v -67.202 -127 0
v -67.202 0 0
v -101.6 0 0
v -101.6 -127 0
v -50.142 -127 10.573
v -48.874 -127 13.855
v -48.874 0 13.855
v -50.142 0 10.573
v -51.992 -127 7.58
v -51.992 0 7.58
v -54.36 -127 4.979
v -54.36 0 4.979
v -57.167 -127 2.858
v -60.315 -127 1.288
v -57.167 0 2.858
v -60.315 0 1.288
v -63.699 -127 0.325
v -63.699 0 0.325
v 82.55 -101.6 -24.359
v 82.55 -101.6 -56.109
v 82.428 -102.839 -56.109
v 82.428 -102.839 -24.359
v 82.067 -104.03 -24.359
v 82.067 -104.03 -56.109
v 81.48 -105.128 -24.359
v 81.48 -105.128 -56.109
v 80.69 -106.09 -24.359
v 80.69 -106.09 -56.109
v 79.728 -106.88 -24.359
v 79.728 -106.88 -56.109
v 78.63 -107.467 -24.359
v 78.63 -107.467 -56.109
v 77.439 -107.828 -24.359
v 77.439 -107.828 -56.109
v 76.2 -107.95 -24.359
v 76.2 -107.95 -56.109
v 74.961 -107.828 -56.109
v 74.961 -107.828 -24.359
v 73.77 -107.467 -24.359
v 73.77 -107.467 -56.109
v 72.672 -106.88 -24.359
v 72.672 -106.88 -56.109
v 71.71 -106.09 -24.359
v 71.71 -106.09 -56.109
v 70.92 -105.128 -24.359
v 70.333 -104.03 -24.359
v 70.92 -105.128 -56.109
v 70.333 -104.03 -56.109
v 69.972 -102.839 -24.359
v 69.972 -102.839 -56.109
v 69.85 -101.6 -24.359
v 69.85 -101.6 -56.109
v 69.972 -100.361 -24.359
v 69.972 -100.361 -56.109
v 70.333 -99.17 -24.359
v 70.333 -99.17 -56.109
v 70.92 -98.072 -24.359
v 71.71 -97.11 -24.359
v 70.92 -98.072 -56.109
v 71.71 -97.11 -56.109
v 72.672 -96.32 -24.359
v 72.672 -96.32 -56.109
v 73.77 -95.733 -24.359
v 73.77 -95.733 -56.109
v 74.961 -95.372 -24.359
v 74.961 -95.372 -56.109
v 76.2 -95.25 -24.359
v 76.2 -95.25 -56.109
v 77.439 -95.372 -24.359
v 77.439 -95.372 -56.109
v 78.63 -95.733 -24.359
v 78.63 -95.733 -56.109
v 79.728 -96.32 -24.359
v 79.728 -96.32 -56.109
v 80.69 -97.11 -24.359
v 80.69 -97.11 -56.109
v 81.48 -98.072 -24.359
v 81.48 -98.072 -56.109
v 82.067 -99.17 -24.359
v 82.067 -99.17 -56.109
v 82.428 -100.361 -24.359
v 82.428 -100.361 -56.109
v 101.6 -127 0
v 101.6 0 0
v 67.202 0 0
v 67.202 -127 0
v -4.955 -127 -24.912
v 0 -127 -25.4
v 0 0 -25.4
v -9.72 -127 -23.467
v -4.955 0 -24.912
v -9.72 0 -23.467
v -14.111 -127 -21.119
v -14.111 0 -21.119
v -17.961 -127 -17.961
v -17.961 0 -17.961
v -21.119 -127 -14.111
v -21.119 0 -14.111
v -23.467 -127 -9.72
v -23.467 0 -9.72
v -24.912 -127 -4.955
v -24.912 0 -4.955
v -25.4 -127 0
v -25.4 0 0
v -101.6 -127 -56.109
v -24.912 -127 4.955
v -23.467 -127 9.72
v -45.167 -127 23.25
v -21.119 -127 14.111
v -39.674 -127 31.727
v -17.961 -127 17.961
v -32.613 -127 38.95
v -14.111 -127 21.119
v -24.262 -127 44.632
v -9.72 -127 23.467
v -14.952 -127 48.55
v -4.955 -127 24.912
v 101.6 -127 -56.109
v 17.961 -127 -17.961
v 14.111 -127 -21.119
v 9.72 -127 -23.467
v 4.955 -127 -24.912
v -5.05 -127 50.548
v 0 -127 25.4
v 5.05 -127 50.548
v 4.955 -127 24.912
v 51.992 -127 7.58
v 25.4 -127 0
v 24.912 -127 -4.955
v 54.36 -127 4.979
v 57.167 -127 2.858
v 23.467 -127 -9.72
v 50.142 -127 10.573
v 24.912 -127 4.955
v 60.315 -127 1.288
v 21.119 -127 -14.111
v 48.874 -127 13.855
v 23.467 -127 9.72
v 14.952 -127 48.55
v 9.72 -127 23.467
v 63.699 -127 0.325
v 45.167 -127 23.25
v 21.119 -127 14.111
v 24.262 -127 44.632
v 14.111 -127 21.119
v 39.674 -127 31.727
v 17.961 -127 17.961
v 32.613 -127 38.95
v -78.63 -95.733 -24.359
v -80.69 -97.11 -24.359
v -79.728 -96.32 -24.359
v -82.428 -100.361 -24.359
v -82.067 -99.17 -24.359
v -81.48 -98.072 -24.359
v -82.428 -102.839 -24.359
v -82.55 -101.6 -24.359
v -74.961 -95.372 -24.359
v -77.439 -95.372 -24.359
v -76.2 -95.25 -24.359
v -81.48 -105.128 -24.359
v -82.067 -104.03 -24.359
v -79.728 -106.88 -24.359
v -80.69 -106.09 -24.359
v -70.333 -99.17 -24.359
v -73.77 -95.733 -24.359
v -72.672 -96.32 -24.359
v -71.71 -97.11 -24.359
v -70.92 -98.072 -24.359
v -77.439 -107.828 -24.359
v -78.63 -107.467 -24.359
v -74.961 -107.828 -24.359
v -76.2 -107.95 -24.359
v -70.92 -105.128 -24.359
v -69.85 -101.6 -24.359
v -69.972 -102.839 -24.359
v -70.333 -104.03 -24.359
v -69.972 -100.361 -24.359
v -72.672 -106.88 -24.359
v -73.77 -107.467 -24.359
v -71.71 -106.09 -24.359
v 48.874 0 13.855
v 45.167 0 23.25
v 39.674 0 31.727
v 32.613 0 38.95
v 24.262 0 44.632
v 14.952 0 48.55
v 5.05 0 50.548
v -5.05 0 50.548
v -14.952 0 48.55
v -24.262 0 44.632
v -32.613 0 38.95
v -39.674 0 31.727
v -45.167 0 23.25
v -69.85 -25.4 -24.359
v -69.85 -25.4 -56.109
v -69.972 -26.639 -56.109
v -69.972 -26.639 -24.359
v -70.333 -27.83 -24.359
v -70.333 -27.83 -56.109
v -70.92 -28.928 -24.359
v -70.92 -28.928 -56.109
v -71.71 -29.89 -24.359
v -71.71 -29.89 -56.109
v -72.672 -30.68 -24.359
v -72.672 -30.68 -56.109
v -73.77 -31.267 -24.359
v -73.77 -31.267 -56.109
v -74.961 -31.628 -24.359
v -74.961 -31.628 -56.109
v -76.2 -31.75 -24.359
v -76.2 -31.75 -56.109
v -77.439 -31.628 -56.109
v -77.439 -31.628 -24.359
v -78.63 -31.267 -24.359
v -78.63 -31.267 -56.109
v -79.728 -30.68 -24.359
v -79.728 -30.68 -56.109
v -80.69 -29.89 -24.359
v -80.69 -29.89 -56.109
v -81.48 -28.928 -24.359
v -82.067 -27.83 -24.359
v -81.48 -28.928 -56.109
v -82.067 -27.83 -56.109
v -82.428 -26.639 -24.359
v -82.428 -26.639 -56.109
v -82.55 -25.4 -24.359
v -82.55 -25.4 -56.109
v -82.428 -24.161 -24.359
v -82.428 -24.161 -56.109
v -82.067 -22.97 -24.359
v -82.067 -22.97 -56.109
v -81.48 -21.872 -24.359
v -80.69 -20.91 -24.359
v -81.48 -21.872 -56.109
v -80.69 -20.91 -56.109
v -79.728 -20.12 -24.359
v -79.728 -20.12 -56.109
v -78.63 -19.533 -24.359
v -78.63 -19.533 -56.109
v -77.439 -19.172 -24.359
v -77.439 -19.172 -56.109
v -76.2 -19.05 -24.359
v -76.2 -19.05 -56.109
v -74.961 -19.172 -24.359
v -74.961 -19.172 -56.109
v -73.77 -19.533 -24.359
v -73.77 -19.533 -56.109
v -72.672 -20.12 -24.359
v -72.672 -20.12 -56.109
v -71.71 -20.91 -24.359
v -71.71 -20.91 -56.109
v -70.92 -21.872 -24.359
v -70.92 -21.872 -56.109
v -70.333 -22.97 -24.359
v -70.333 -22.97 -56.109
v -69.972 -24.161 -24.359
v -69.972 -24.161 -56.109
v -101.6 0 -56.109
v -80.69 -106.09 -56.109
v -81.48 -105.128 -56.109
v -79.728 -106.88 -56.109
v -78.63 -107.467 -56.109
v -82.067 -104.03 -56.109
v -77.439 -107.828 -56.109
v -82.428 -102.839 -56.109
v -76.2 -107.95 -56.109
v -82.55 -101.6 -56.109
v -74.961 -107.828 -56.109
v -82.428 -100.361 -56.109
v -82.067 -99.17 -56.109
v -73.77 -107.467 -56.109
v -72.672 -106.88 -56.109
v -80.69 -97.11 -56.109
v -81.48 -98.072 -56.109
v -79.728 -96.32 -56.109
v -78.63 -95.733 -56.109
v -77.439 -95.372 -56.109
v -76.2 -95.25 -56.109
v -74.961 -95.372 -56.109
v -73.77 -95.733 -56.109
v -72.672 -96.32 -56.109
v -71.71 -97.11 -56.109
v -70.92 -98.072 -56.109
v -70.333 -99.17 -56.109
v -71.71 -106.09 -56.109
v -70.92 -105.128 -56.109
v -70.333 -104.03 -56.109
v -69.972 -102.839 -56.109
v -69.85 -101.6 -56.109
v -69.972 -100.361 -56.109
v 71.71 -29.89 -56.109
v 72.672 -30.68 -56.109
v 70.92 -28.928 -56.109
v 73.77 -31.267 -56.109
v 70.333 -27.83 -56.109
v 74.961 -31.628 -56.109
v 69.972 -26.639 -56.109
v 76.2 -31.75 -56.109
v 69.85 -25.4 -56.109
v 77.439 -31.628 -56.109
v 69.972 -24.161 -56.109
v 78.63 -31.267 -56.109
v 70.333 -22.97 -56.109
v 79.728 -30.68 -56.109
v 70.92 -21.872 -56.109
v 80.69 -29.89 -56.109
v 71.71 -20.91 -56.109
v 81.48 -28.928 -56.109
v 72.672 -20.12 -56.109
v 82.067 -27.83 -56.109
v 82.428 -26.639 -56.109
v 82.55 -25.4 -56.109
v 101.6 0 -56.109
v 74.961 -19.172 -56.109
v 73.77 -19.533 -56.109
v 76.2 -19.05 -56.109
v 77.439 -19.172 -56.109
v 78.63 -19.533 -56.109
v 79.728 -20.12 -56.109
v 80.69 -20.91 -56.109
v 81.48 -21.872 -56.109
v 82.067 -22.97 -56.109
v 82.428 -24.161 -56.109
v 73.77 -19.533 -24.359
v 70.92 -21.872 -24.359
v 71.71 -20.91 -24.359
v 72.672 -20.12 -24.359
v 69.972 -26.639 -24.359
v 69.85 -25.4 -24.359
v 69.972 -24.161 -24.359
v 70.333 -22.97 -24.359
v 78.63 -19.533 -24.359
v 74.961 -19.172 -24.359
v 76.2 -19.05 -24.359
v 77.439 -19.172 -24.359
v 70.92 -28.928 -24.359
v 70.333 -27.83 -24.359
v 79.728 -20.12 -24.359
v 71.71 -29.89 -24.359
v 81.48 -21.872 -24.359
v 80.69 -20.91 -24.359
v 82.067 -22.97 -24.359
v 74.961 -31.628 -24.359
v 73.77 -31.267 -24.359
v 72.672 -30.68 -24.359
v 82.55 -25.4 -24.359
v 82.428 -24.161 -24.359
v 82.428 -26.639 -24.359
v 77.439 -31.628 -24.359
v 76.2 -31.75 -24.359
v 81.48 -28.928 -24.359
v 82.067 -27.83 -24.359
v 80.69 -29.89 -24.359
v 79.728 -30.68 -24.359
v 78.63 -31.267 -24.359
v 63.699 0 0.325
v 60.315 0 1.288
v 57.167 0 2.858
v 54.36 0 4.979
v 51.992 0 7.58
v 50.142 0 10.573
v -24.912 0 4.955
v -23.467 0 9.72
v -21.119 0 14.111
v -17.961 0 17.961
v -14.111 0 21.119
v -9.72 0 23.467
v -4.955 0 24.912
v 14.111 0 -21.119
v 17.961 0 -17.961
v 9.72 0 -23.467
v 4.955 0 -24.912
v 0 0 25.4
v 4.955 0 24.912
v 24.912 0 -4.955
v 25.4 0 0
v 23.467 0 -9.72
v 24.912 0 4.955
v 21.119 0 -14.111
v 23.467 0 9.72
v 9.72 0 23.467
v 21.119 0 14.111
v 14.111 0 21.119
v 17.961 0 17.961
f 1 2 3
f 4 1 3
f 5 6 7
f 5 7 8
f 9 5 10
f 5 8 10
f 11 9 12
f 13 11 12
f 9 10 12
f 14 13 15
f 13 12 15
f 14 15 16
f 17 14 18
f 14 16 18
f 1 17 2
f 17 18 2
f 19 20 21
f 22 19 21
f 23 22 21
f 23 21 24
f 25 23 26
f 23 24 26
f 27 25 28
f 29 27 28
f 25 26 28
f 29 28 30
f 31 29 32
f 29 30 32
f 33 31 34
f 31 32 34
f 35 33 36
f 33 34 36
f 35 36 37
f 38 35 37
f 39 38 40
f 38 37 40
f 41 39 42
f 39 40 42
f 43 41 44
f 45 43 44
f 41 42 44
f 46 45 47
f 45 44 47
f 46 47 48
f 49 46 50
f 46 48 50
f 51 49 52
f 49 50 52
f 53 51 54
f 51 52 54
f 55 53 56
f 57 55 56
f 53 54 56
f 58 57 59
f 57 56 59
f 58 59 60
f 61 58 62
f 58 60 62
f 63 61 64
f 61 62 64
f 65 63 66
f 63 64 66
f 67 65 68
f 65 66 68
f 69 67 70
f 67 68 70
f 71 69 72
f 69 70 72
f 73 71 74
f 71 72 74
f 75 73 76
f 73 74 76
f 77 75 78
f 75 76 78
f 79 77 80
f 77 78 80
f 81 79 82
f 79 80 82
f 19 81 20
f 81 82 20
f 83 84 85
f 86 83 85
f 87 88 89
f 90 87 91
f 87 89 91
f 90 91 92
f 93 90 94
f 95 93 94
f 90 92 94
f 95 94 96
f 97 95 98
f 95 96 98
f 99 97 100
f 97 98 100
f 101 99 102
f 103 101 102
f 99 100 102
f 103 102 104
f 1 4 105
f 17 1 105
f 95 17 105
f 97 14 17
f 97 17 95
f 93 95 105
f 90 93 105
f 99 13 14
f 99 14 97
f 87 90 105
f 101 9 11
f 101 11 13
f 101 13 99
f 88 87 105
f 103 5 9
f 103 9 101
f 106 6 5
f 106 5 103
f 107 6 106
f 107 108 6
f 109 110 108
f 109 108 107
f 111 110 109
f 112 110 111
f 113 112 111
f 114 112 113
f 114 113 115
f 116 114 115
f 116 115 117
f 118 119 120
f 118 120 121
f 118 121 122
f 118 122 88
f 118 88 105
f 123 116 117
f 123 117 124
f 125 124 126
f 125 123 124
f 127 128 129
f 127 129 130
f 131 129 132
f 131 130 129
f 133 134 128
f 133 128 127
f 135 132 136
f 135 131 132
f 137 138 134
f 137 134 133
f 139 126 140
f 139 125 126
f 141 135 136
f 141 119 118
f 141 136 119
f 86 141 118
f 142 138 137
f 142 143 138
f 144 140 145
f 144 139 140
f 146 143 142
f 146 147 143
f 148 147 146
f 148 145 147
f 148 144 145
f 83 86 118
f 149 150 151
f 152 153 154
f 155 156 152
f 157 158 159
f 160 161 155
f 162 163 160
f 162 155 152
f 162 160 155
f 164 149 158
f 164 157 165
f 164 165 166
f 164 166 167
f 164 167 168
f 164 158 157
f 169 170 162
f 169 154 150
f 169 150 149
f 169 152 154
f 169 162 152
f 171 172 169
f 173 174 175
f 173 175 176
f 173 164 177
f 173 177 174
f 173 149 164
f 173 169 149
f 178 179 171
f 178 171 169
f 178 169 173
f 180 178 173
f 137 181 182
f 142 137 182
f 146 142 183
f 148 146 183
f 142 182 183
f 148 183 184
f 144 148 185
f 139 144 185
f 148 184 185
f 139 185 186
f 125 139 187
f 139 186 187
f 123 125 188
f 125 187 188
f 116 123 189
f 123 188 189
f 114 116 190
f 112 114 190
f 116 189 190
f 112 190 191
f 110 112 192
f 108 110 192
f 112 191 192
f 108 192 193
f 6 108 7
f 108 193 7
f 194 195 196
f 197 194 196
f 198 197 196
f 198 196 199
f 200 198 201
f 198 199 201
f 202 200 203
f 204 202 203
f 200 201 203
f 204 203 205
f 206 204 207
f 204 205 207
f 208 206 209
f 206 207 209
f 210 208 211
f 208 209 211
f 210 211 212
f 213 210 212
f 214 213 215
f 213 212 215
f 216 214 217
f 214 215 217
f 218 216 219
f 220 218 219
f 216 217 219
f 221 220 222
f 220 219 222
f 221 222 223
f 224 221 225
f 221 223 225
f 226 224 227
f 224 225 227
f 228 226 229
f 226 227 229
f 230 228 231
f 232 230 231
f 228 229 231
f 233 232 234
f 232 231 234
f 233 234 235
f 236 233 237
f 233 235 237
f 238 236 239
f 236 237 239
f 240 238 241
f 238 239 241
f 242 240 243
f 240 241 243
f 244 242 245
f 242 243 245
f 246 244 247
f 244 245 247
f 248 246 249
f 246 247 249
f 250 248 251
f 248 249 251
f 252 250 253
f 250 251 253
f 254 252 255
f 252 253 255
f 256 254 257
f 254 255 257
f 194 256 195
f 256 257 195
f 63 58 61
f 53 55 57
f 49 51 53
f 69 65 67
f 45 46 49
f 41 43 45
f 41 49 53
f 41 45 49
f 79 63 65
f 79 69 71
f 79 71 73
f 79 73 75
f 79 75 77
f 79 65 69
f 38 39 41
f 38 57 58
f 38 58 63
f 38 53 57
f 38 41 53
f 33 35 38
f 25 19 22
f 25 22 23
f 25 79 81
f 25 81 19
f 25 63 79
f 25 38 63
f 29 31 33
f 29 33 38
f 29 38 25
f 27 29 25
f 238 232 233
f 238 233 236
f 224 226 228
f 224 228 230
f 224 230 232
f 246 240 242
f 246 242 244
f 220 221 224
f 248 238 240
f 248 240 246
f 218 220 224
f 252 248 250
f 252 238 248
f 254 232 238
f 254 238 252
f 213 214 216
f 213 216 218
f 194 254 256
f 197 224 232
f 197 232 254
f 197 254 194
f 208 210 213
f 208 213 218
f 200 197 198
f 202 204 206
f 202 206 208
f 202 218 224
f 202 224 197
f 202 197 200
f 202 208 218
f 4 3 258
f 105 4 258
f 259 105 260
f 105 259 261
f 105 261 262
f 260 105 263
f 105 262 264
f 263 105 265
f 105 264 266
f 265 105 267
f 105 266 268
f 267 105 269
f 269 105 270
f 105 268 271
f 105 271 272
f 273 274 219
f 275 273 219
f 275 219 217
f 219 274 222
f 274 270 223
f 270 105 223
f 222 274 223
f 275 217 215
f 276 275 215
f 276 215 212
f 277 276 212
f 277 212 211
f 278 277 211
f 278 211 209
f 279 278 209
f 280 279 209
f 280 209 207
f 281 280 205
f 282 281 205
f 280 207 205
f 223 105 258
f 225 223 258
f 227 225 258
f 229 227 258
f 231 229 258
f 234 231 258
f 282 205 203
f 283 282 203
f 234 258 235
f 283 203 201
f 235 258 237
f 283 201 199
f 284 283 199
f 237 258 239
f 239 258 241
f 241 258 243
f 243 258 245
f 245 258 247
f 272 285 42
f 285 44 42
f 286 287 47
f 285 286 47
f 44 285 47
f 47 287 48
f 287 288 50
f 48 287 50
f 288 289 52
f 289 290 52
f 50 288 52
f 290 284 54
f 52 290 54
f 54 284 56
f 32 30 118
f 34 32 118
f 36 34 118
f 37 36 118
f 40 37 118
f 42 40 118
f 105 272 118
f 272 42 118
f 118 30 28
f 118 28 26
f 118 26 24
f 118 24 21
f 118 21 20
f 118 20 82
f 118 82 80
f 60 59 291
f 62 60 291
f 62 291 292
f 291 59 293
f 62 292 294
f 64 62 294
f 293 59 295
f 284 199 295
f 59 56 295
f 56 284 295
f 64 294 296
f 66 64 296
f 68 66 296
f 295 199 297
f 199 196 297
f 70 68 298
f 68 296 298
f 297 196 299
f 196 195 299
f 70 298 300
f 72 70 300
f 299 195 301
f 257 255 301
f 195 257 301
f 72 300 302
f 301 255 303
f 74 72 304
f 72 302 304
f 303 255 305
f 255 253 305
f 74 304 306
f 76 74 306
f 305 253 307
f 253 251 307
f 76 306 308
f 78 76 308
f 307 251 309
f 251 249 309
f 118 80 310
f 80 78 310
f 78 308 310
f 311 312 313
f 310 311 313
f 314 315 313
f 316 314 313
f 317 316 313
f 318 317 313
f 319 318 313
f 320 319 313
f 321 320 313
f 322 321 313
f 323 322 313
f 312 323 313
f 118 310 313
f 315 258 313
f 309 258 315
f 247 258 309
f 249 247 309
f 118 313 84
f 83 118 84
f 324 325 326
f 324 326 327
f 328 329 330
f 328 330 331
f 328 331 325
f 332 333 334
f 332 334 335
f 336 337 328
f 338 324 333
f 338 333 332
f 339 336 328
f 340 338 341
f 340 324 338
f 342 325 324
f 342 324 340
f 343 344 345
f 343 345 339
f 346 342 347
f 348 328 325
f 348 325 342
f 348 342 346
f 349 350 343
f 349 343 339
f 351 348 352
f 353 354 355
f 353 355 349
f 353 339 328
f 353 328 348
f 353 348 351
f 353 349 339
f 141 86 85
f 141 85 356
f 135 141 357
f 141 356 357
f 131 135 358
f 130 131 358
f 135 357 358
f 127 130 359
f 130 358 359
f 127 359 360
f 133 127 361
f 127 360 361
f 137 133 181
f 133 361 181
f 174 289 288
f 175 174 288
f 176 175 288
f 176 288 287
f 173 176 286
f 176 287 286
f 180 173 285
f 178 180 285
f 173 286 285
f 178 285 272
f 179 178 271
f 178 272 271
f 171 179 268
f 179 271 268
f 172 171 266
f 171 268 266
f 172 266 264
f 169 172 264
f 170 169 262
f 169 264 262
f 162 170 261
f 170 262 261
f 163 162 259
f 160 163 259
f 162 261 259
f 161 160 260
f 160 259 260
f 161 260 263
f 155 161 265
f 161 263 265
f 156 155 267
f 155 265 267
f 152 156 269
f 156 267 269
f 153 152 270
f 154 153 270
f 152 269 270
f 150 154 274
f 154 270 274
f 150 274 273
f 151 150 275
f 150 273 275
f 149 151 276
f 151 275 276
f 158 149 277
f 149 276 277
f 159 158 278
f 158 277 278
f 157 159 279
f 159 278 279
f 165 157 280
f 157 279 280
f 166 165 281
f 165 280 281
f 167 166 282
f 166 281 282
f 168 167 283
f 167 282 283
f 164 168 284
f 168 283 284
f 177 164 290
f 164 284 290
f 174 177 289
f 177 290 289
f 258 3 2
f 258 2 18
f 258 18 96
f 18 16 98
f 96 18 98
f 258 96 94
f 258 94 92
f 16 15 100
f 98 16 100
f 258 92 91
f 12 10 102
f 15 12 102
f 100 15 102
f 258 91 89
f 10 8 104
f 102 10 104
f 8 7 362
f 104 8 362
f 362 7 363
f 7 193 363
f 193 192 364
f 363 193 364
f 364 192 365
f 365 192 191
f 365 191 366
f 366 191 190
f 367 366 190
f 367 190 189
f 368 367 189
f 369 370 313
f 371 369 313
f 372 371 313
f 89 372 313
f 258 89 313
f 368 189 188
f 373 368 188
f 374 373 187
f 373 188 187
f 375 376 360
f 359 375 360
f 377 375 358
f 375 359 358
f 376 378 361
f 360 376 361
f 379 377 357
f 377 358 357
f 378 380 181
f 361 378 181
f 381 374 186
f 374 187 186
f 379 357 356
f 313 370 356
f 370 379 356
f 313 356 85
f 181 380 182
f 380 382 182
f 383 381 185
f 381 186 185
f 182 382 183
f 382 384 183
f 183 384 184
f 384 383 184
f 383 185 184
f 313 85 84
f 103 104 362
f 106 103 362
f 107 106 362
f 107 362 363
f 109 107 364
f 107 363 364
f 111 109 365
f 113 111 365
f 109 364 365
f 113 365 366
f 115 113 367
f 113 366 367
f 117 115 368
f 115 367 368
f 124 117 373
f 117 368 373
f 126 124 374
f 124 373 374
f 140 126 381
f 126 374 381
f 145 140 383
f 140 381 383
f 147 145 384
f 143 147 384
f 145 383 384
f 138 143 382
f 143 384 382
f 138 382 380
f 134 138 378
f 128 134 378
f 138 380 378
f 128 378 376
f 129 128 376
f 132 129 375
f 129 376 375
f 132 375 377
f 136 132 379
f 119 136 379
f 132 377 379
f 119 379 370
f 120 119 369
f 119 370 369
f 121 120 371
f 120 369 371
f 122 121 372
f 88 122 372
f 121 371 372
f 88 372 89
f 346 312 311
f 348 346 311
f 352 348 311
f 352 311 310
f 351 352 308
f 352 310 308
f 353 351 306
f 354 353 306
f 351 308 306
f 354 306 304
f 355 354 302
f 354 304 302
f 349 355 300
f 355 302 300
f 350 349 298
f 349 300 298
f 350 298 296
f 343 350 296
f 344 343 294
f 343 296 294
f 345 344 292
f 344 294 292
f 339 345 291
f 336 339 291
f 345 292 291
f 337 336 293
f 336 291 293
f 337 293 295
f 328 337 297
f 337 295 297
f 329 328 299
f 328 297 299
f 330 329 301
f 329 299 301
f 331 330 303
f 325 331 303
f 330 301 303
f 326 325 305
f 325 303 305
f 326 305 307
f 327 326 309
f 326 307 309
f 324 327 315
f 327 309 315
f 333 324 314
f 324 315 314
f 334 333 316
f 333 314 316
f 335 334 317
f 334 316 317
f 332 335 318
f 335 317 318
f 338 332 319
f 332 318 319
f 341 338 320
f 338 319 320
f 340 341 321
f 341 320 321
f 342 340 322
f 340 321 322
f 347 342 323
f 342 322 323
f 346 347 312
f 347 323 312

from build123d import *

# Parameters (mm, degrees)
F1_DEPTH = 127
F2_R     = 6.35
F3_DEPTH = 31.75


with BuildPart() as f1:
    # F0 (on Front) → F1 (new body)
    with BuildSketch(Plane.XZ):
        with BuildLine():
            Line((-101.6, -56.109019), (0, -56.109019))
            Line((0, -56.109019), (101.6, -56.109019))
            Line((101.6, -56.109019), (101.6, 0))
            Line((101.6, 0), (67.202083, 0))
            ThreePointArc((67.202083, 0), (55.714501, 3.853357), (48.874242, 13.854545))
            ThreePointArc((48.874242, 13.854545), (0, 50.8), (-48.874242, 13.854545))
            ThreePointArc((-48.874242, 13.854545), (-55.714501, 3.853357), (-67.202083, 0))
            Line((-67.202083, 0), (-101.6, 0))
            Line((-101.6, 0), (-101.6, -56.109019))
        make_face()
        with BuildLine():
            ThreePointArc((-25.4, 0), (0, 25.4), (25.4, 0))
            ThreePointArc((25.4, 0), (17.960512, -17.960512), (0, -25.4))
            ThreePointArc((0, -25.4), (-17.960512, -17.960512), (-25.4, 0))
        make_face(mode=Mode.SUBTRACT)
    extrude(amount=F1_DEPTH)

    # F2 (on face) → F3 (cut)
    with BuildSketch(Plane(origin=(0, 0, -56.109019), x_dir=(1, 0, 0), z_dir=(0, 0, -1))):
        with Locations((-76.2, 101.6)):
            Circle(F2_R)
        with Locations((-76.2, 25.4)):
            Circle(F2_R)
        with Locations((76.2, 101.6)):
            Circle(F2_R)
        with Locations((76.2, 25.4)):
            Circle(F2_R)
    extrude(amount=-F3_DEPTH, mode=Mode.SUBTRACT)


solid = f1.part
